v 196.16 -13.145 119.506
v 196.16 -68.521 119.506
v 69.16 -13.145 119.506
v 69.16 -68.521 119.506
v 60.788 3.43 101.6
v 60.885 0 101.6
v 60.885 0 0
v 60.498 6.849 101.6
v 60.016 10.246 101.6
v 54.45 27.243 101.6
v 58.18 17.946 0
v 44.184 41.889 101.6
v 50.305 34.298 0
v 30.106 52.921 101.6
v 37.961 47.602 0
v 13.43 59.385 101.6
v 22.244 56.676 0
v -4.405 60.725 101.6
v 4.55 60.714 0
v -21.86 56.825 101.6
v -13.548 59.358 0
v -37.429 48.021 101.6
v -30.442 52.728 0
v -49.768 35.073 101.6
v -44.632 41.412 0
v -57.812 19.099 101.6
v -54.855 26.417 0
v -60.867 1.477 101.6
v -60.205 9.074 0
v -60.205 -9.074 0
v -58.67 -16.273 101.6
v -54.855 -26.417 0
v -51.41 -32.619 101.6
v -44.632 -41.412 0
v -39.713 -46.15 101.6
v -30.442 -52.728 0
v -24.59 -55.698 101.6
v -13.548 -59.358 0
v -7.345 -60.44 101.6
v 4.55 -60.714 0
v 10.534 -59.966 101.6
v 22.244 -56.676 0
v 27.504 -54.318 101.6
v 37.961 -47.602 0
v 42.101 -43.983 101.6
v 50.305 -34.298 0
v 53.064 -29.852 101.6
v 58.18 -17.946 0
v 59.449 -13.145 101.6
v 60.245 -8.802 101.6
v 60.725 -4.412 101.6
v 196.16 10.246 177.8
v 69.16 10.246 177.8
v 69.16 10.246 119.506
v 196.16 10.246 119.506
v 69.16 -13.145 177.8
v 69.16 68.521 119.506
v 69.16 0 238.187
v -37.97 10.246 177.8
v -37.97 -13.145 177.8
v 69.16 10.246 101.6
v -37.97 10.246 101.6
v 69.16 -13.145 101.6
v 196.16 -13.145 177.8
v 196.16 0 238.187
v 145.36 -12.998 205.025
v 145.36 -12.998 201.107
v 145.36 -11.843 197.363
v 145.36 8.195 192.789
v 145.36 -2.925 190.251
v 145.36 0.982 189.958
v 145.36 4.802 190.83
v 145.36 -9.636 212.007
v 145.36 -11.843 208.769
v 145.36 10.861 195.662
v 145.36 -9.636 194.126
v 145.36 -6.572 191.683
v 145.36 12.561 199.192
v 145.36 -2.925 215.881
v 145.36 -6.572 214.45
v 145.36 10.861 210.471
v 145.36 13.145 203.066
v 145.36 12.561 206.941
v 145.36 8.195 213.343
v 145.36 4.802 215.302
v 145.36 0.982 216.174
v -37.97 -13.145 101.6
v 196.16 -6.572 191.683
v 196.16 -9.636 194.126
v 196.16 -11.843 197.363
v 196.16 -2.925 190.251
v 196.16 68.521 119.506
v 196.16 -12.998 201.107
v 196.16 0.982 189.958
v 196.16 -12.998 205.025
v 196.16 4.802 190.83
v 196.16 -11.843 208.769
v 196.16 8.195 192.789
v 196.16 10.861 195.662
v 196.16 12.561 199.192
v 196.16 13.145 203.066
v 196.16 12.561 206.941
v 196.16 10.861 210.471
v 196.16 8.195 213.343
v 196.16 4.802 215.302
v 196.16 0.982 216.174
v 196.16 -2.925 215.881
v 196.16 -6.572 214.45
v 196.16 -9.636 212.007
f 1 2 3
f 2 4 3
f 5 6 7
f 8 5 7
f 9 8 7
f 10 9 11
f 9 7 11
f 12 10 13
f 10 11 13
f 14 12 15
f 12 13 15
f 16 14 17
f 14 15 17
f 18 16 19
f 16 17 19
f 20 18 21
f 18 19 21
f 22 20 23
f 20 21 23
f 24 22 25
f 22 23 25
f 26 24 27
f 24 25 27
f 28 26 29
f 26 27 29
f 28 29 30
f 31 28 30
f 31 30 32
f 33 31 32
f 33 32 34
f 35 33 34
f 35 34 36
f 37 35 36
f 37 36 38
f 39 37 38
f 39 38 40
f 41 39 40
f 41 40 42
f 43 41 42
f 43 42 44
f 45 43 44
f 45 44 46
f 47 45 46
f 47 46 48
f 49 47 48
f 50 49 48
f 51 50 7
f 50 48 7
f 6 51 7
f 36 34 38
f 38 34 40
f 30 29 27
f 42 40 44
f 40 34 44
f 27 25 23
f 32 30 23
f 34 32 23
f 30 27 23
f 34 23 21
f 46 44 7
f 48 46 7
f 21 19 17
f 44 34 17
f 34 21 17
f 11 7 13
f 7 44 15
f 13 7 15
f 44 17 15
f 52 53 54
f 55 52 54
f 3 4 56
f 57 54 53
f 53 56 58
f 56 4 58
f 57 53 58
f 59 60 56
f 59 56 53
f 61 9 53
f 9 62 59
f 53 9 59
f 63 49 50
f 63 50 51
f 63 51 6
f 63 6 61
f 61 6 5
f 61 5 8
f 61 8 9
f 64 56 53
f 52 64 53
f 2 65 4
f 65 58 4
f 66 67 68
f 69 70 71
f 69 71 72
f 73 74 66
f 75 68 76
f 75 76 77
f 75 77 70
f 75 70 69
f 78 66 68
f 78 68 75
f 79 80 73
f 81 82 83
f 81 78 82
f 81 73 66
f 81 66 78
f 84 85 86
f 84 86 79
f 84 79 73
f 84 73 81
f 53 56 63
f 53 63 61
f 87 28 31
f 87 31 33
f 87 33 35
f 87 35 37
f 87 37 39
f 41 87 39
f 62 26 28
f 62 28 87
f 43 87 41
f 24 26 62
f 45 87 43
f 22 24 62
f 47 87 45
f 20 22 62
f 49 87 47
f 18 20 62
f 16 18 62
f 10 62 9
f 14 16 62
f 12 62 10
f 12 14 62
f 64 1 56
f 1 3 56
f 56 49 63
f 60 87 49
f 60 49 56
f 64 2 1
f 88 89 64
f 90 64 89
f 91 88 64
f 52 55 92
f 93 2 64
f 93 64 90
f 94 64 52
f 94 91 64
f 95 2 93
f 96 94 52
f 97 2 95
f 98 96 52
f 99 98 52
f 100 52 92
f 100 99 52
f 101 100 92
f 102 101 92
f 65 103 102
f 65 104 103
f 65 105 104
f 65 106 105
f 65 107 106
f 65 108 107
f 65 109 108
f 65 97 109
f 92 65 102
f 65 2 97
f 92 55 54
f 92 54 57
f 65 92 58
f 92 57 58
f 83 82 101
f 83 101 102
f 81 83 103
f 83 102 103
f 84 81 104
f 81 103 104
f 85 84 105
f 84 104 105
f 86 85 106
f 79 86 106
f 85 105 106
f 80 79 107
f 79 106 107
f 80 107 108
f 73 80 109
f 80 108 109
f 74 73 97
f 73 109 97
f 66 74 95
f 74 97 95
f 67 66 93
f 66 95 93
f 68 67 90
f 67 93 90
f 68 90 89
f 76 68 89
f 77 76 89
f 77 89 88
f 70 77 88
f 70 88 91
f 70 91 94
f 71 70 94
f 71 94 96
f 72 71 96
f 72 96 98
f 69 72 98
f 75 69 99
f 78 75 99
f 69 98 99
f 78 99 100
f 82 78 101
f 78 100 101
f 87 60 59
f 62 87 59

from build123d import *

# Parameters (mm, degrees)
F0_R     = 60.8847176051
F1_DEPTH = 101.6
F2_W     = 81.7296952009
F2_H     = 23.3908817172
F3_DEPTH = 76.2
F4_DEPTH = 25.4
F6_DEPTH = 101.6
F7_DEPTH = 25.4
F8_R     = 13.1445070729
F9_DEPTH = 50.8


with BuildPart() as f1:
    # F0 (on Top) → F1 (new body)
    with BuildSketch(Plane.XY):
        Circle(F0_R)
    extrude(amount=F1_DEPTH)

    # F2 (on face) → F3 (join)
    with BuildSketch(Plane.XY.offset(101.6)):
        with Locations((2.8951317072, -1.4490662143)):
            Rectangle(F2_W, F2_H)
    extrude(amount=F3_DEPTH)

    # F4 (add): a face of the model
    f4_faces = [f1.faces().sort_by_distance(p)[0] for p in [
        (43.7599793077, -1.4490662143, 139.7),
    ]]
    extrude(f4_faces, amount=F4_DEPTH)


with BuildPart() as f6:
    # F5 (on face) → F6 (new body)
    with BuildSketch(Plane.YZ.offset(69.1599793077)):
        Polygon((10.2463746443, 119.5061579347), (68.5206226804, 119.5061579347), (0, 238.1873577833), (-68.5206226804, 119.5061579347), (-13.1445070729, 119.5061579347), (-13.1445070729, 177.8), (10.2463746443, 177.8), align=None)
    extrude(amount=F6_DEPTH)

    # F7 (add): a face of the model
    f7_faces = [f6.faces().sort_by_distance(p)[0] for p in [
        (170.7599793077, 39.3834986624, 121.3190432076),
    ]]
    extrude(f7_faces, amount=F7_DEPTH)

    # F8 (on face) → F9 (cut)
    with BuildSketch(Plane.YZ.offset(196.1599793077)):
        with Locations((0, 203.0661553144)):
            Circle(F8_R)
    extrude(amount=-F9_DEPTH, mode=Mode.SUBTRACT)


solid = Compound([f1.part, f6.part])
